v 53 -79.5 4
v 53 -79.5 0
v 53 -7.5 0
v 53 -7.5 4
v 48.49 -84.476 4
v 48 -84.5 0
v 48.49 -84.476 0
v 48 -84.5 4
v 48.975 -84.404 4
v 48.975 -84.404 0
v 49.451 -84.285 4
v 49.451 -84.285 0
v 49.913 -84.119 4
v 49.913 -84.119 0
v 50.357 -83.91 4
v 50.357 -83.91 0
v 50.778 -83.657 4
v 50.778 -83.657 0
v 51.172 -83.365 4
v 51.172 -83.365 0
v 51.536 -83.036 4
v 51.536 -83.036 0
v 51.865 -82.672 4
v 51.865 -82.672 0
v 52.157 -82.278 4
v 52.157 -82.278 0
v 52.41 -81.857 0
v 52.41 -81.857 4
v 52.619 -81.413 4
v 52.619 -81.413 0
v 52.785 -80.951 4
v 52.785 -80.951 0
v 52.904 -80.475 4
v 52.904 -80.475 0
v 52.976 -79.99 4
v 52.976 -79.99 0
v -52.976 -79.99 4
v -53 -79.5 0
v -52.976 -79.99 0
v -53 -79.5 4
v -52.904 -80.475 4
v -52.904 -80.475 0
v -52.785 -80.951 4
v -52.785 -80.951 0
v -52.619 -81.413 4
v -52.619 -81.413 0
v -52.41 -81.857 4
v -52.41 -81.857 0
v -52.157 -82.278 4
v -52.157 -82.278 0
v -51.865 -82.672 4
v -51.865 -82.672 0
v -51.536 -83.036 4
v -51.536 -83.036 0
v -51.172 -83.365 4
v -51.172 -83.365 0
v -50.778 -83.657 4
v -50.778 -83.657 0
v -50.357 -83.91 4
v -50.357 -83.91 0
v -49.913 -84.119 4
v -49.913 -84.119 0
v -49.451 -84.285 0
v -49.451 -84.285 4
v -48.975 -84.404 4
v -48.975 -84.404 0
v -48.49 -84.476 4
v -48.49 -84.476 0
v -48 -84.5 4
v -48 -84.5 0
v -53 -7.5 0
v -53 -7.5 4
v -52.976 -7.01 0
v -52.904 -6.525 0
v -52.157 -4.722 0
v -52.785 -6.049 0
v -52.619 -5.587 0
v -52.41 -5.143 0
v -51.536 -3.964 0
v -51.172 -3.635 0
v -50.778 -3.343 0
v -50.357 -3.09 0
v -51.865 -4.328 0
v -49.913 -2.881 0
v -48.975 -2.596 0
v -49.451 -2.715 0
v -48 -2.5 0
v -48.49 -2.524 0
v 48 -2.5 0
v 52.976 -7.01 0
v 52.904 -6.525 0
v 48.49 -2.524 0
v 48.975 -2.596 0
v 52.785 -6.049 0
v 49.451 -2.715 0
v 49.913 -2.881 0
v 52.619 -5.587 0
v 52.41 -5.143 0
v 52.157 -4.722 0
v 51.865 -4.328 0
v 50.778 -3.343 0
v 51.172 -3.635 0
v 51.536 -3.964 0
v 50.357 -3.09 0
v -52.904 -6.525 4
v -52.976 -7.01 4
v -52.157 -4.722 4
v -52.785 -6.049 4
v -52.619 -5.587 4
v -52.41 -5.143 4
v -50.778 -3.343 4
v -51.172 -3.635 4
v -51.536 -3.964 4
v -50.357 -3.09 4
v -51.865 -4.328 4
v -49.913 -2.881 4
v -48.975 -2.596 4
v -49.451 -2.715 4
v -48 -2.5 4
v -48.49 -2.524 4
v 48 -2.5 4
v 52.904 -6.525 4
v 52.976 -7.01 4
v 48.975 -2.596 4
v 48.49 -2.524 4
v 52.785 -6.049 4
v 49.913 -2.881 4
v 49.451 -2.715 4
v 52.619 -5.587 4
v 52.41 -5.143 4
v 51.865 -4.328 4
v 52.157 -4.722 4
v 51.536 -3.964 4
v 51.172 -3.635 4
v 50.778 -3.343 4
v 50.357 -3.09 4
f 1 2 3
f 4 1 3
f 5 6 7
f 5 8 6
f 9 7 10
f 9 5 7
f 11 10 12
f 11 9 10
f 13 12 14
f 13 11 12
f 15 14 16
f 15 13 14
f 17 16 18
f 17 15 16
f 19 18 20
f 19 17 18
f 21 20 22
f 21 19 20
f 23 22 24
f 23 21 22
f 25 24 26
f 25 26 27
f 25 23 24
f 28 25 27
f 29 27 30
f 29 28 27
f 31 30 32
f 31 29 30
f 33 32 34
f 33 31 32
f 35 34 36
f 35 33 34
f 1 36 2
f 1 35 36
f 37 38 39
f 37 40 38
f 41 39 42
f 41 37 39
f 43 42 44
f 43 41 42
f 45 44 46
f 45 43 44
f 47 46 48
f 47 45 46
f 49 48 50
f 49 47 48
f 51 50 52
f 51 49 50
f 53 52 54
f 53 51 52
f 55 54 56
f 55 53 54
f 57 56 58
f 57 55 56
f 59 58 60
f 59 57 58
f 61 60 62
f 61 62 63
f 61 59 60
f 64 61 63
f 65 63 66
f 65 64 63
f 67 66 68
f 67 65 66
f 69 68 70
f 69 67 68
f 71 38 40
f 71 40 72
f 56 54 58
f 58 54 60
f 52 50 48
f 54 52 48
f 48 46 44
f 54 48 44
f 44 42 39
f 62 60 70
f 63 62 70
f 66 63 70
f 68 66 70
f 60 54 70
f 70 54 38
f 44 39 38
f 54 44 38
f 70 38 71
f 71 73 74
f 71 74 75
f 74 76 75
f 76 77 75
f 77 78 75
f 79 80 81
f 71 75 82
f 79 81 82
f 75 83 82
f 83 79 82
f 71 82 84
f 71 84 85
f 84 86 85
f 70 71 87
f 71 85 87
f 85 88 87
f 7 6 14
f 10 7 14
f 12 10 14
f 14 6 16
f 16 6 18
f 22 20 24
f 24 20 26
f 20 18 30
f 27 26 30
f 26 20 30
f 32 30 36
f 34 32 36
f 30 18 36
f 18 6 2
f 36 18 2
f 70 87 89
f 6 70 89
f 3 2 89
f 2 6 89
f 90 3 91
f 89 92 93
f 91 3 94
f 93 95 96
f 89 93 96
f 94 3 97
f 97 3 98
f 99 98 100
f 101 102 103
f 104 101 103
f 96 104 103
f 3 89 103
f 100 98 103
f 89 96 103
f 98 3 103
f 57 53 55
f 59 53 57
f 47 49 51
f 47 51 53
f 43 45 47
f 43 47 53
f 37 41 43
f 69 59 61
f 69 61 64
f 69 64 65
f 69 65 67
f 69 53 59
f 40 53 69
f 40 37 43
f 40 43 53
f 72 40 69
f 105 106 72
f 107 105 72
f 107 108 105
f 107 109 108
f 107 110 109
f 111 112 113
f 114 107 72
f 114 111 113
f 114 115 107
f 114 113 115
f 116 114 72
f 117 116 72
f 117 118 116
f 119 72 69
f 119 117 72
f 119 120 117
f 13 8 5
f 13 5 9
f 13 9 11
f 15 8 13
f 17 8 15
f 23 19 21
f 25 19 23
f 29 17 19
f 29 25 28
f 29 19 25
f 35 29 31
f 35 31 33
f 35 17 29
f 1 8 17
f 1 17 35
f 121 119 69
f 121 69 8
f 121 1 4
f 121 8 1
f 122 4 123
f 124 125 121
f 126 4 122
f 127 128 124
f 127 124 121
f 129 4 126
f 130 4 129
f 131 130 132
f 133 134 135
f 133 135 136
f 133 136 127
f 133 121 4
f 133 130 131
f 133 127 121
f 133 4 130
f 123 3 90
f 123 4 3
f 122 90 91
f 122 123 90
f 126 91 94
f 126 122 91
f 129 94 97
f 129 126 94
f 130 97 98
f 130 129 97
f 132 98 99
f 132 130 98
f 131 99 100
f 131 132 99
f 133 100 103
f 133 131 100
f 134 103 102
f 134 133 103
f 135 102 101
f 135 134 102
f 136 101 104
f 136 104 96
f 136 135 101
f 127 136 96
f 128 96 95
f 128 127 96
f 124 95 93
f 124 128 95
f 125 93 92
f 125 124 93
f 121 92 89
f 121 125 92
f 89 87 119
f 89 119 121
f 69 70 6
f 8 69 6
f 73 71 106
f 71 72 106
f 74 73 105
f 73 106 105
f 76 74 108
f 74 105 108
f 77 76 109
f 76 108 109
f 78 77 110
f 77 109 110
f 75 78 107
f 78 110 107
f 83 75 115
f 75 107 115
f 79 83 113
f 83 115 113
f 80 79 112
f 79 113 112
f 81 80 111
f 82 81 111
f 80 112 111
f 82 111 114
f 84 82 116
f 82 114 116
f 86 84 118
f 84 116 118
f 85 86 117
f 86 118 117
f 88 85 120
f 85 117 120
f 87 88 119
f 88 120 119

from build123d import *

# Parameters (mm, degrees)
F0_W     = 106
F0_H     = 82
F1_DEPTH = 4
F2_R     = 5


# Not quite as in the source:
# - a feature names something its author has since deleted; it is built from what else it names


with BuildPart() as f1:
    # F0 (on Top) → F1 (new body)
    with BuildSketch(Plane.XY):
        with Locations((0, -43.5)):
            Rectangle(F0_W, F0_H)
    extrude(amount=F1_DEPTH)

    # F2
    f2_edges = [f1.edges().sort_by_distance(p)[0] for p in [
        (53, -84.5, 2),
        (-53, -84.5, 2),
        (-53, -2.5, 2),
        (53, -2.5, 2),
    ]]
    fillet(f2_edges, radius=F2_R)


solid = f1.part
